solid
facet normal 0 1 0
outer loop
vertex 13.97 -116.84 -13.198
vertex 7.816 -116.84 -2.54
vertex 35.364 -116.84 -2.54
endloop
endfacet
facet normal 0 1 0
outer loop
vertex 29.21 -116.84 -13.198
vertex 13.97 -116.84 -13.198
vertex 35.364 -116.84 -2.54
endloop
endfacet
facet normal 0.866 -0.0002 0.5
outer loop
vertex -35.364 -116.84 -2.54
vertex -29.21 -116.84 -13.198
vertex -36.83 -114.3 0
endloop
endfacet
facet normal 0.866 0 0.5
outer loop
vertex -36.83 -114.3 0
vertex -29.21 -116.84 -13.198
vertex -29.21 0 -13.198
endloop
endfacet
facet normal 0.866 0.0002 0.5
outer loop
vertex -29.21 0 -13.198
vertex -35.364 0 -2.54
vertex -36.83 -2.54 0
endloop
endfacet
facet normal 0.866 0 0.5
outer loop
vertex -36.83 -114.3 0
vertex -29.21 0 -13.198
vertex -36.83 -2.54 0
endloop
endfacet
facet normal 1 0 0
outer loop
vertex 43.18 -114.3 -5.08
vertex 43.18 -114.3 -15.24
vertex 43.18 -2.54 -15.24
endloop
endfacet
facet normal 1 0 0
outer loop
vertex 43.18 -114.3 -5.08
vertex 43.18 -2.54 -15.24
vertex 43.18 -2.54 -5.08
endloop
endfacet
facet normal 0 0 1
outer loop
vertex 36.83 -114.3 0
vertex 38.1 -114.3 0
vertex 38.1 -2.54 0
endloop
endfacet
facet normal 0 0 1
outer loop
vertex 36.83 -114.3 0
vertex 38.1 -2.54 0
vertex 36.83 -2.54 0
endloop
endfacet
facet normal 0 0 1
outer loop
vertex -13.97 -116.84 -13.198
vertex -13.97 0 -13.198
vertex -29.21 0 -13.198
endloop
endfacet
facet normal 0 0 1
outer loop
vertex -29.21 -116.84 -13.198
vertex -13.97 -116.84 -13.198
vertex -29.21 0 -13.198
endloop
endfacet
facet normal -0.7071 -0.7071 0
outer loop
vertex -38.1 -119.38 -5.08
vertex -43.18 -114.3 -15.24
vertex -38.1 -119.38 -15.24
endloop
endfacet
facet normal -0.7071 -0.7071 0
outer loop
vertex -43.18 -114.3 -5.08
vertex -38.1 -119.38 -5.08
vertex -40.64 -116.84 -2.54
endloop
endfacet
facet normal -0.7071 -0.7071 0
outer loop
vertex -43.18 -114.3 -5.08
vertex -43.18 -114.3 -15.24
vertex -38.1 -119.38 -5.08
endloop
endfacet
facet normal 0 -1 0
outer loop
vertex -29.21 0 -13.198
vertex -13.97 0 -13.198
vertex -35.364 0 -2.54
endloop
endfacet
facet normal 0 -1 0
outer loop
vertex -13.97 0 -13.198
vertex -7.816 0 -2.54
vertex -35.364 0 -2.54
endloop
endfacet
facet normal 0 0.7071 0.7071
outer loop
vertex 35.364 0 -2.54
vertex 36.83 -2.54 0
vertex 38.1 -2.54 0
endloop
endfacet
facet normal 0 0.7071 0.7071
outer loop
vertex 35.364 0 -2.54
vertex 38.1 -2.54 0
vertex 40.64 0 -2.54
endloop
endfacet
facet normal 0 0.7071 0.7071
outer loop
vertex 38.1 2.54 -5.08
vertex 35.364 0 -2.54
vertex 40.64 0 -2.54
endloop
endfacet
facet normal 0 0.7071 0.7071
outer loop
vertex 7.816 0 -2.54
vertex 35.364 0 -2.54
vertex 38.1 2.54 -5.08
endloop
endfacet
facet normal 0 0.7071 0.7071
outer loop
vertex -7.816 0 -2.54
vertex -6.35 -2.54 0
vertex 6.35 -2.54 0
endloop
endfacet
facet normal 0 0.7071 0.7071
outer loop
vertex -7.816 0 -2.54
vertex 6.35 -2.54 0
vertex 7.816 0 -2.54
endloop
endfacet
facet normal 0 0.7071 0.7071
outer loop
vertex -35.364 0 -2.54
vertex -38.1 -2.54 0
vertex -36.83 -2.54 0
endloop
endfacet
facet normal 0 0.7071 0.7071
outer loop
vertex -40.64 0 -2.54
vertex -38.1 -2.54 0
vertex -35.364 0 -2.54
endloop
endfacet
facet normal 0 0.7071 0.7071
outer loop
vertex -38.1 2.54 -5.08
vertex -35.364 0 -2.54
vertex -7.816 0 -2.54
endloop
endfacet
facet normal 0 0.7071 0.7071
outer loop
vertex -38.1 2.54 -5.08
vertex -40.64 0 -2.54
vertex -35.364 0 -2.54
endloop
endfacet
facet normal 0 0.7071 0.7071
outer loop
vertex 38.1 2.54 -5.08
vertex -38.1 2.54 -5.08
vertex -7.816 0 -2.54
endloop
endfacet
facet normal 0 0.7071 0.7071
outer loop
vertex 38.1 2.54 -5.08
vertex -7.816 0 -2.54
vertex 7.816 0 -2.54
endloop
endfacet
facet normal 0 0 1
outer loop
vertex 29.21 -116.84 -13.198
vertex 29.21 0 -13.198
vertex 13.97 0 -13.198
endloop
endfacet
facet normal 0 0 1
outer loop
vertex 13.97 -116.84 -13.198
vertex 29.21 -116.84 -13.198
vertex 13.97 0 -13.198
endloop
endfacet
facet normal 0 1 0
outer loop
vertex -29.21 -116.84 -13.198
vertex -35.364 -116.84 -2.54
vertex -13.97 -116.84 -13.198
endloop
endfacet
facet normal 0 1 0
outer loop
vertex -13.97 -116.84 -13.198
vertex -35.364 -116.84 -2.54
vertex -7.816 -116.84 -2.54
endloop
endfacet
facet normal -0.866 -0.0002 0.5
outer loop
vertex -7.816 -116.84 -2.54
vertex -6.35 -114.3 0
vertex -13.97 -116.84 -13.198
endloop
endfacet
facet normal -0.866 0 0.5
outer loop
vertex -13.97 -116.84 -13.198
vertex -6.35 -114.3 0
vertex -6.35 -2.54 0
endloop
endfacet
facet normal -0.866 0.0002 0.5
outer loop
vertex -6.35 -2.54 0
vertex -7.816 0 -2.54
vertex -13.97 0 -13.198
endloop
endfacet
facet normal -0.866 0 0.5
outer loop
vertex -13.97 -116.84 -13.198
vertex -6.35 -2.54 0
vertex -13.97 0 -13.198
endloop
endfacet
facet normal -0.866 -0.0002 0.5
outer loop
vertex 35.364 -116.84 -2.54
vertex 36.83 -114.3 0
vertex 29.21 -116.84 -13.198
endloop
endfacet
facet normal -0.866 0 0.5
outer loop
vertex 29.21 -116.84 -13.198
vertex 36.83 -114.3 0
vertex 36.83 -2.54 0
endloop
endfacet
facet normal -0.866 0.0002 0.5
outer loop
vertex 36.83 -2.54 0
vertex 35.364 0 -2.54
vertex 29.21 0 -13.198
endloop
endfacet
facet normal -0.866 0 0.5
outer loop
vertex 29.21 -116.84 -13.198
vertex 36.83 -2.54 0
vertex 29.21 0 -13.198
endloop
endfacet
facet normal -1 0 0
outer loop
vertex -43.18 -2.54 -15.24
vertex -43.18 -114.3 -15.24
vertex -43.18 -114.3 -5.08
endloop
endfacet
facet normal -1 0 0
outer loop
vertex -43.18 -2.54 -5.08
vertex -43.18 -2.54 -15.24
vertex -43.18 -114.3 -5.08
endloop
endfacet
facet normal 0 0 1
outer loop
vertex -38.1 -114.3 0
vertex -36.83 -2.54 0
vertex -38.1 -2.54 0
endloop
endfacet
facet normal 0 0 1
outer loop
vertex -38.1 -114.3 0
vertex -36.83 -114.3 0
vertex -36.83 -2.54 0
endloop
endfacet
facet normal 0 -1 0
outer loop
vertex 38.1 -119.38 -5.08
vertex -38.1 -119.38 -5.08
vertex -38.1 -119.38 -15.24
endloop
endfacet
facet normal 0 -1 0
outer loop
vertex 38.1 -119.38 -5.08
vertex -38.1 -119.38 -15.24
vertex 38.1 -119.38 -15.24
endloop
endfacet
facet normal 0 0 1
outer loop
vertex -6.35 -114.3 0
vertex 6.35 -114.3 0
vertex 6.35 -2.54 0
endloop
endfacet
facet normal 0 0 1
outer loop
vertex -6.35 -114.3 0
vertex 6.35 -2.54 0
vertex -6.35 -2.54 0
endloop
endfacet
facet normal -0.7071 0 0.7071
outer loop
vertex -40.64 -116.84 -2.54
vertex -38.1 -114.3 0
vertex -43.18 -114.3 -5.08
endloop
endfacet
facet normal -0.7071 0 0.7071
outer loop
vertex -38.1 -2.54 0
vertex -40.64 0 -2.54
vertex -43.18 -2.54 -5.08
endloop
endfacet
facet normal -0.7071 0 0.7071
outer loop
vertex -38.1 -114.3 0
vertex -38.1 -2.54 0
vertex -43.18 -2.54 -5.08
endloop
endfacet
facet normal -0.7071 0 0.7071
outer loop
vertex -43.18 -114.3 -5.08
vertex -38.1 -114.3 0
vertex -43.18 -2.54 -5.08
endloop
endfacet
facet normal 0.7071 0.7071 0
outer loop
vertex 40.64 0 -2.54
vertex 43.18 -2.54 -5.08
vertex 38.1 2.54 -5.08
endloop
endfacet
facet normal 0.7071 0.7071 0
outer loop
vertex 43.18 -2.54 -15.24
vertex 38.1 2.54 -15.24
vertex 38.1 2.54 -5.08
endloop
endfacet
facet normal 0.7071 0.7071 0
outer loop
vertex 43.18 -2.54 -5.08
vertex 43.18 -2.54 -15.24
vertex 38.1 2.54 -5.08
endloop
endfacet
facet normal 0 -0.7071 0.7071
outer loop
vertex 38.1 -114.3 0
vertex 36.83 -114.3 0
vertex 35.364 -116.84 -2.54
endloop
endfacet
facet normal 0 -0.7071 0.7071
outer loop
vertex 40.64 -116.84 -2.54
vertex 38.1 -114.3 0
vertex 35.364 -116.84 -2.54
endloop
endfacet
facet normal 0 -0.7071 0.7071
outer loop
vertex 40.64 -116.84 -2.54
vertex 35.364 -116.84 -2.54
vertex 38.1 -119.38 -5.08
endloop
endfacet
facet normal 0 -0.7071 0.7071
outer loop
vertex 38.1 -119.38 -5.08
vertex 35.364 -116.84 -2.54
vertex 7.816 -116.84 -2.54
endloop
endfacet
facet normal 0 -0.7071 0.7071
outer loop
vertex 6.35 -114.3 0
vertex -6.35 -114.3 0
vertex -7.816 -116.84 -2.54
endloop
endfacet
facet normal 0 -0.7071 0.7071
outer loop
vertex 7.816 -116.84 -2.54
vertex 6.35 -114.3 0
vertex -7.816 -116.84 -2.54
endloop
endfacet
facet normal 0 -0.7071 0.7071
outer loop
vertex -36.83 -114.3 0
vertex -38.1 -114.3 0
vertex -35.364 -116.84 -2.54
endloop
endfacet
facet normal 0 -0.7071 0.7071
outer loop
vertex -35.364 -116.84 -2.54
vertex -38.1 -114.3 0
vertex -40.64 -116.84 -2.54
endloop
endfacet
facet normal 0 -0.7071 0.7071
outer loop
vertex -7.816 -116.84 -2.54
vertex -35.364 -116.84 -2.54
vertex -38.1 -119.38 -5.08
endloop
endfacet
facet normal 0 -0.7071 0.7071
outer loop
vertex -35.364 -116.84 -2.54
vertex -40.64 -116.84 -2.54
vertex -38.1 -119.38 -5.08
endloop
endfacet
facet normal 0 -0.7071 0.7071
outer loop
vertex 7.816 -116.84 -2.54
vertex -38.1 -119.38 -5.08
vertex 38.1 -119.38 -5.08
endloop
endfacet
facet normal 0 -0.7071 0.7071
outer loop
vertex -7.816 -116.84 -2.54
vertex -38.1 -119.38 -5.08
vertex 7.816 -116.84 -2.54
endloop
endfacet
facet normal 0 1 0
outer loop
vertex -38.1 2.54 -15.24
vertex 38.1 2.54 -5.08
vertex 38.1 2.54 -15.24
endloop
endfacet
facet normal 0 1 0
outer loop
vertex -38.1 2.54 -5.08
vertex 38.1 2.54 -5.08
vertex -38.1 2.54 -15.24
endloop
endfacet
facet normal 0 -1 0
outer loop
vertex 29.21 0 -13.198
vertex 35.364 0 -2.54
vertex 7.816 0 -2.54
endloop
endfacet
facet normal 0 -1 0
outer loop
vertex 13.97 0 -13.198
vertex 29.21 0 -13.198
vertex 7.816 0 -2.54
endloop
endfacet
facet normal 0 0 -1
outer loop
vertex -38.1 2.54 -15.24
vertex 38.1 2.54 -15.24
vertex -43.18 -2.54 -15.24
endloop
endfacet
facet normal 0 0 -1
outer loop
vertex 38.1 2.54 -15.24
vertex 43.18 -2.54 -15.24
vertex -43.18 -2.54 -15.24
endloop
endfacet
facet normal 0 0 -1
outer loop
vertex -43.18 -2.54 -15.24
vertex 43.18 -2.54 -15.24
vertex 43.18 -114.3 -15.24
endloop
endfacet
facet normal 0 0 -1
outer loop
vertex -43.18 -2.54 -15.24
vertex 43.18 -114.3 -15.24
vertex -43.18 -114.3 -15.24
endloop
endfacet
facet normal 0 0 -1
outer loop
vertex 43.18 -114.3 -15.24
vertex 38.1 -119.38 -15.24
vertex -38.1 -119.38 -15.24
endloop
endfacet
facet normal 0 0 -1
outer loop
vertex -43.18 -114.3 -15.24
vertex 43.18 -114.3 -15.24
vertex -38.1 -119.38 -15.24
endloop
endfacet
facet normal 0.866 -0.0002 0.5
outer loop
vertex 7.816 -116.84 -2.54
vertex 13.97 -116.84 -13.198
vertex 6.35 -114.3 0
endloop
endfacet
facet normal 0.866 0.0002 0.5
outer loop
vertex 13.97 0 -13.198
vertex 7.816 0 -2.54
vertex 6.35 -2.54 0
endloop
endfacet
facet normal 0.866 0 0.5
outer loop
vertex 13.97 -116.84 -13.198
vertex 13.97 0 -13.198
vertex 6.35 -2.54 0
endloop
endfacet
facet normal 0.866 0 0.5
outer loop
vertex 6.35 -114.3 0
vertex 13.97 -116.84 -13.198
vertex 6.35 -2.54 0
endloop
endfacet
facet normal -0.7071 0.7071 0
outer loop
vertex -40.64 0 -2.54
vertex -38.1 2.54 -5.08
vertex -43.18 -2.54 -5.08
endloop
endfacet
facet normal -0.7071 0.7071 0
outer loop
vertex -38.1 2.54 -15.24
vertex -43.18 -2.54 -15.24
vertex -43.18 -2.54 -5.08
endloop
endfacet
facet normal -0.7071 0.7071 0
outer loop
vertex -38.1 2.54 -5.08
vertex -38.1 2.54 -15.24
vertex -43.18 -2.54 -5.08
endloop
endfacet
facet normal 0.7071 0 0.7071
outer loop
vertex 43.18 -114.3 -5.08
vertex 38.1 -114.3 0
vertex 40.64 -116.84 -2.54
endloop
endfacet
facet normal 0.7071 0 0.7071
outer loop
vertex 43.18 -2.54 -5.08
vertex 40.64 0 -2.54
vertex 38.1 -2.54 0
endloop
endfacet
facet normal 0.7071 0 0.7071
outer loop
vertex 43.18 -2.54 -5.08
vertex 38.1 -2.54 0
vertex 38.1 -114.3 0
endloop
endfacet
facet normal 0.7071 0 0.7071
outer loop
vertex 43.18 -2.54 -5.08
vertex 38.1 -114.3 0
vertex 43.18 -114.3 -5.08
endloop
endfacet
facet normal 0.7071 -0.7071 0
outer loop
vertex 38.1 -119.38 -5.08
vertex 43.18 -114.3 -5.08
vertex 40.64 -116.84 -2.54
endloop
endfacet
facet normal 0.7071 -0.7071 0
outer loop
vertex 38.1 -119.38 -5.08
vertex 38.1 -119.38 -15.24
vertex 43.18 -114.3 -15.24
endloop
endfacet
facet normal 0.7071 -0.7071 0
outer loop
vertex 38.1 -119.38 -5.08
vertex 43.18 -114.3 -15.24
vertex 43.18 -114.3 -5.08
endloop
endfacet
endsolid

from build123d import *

# Parameters (mm, degrees)
F1_DEPTH    = 116.84
F2_W        = 86.36
F2_H        = 15.24
F3_DEPTH    = 2.54
F4_W        = 86.36
F4_H        = 15.24
F5_DEPTH    = 2.54
F6_T1_DEPTH = 148.0482991577
F6_T3_DEPTH = 112.4882991577
F7_SIZE     = 5.08


# Not quite as in the source:
# - a fillet or chamfer that OpenCascade refuses, or shapes differently, is made with other operations: its cross-section is extruded or revolved along the edge and cut away or added


with BuildPart() as f1:
    # F0 (on Front) → F1 (new body)
    with BuildSketch(Plane.XZ):
        Polygon((43.18, 0), (36.83, 0), (29.21, -13.1982271537), (13.97, -13.1982271537), (6.35, 0), (0, 0), (-6.35, 0), (-13.97, -13.1982271537), (-29.21, -13.1982271537), (-36.83, 0), (-43.18, 0), (-43.18, -15.24), (0, -15.24), (43.18, -15.24), align=None)
    extrude(amount=F1_DEPTH)

    # F2 (on face) → F3 (join)
    with BuildSketch(Plane.XZ.offset(116.84)):
        with Locations((0, -7.62)):
            Rectangle(F2_W, F2_H)
    extrude(amount=F3_DEPTH)

    # F4 (on face) → F5 (join)
    with BuildSketch(Plane(origin=(0, 0, 0), x_dir=(-1, 0, 0), z_dir=(0, 1, 0))):
        with Locations((0, -7.62)):
            Rectangle(F4_W, F4_H)
    extrude(amount=F5_DEPTH)

    # F6: chamfer of 5.08 on 4 edges, made by hand

    # F6_s2 → F6_t1 (cut)
    with BuildSketch(Plane.XZ.offset(-15.6041495789)):
        Polygon((-38.1, 0), (-43.18, -5.08), (-43.18, 0), align=None)
        Polygon((38.1, 0), (43.18, -5.08), (43.18, 0), align=None)
    extrude(amount=F6_T1_DEPTH, mode=Mode.SUBTRACT)

    # F6_s4 → F6_t3 (cut)
    with BuildSketch(Plane.YZ.offset(-56.2441495789)):
        Polygon((-114.3, 0), (-119.38, -5.08), (-119.38, 0), align=None)
        Polygon((-2.54, 0), (2.54, -5.08), (2.54, 0), align=None)
    extrude(amount=F6_T3_DEPTH, mode=Mode.SUBTRACT)

    # F7
    f7_edges = [f1.edges().sort_by_distance(p)[0] for p in [
        (-43.18, -119.38, -10.16),
        (43.18, -119.38, -10.16),
        (43.18, 2.54, -10.16),
        (-43.18, 2.54, -10.16),
    ]]
    chamfer(f7_edges, length=F7_SIZE)


solid = f1.part
